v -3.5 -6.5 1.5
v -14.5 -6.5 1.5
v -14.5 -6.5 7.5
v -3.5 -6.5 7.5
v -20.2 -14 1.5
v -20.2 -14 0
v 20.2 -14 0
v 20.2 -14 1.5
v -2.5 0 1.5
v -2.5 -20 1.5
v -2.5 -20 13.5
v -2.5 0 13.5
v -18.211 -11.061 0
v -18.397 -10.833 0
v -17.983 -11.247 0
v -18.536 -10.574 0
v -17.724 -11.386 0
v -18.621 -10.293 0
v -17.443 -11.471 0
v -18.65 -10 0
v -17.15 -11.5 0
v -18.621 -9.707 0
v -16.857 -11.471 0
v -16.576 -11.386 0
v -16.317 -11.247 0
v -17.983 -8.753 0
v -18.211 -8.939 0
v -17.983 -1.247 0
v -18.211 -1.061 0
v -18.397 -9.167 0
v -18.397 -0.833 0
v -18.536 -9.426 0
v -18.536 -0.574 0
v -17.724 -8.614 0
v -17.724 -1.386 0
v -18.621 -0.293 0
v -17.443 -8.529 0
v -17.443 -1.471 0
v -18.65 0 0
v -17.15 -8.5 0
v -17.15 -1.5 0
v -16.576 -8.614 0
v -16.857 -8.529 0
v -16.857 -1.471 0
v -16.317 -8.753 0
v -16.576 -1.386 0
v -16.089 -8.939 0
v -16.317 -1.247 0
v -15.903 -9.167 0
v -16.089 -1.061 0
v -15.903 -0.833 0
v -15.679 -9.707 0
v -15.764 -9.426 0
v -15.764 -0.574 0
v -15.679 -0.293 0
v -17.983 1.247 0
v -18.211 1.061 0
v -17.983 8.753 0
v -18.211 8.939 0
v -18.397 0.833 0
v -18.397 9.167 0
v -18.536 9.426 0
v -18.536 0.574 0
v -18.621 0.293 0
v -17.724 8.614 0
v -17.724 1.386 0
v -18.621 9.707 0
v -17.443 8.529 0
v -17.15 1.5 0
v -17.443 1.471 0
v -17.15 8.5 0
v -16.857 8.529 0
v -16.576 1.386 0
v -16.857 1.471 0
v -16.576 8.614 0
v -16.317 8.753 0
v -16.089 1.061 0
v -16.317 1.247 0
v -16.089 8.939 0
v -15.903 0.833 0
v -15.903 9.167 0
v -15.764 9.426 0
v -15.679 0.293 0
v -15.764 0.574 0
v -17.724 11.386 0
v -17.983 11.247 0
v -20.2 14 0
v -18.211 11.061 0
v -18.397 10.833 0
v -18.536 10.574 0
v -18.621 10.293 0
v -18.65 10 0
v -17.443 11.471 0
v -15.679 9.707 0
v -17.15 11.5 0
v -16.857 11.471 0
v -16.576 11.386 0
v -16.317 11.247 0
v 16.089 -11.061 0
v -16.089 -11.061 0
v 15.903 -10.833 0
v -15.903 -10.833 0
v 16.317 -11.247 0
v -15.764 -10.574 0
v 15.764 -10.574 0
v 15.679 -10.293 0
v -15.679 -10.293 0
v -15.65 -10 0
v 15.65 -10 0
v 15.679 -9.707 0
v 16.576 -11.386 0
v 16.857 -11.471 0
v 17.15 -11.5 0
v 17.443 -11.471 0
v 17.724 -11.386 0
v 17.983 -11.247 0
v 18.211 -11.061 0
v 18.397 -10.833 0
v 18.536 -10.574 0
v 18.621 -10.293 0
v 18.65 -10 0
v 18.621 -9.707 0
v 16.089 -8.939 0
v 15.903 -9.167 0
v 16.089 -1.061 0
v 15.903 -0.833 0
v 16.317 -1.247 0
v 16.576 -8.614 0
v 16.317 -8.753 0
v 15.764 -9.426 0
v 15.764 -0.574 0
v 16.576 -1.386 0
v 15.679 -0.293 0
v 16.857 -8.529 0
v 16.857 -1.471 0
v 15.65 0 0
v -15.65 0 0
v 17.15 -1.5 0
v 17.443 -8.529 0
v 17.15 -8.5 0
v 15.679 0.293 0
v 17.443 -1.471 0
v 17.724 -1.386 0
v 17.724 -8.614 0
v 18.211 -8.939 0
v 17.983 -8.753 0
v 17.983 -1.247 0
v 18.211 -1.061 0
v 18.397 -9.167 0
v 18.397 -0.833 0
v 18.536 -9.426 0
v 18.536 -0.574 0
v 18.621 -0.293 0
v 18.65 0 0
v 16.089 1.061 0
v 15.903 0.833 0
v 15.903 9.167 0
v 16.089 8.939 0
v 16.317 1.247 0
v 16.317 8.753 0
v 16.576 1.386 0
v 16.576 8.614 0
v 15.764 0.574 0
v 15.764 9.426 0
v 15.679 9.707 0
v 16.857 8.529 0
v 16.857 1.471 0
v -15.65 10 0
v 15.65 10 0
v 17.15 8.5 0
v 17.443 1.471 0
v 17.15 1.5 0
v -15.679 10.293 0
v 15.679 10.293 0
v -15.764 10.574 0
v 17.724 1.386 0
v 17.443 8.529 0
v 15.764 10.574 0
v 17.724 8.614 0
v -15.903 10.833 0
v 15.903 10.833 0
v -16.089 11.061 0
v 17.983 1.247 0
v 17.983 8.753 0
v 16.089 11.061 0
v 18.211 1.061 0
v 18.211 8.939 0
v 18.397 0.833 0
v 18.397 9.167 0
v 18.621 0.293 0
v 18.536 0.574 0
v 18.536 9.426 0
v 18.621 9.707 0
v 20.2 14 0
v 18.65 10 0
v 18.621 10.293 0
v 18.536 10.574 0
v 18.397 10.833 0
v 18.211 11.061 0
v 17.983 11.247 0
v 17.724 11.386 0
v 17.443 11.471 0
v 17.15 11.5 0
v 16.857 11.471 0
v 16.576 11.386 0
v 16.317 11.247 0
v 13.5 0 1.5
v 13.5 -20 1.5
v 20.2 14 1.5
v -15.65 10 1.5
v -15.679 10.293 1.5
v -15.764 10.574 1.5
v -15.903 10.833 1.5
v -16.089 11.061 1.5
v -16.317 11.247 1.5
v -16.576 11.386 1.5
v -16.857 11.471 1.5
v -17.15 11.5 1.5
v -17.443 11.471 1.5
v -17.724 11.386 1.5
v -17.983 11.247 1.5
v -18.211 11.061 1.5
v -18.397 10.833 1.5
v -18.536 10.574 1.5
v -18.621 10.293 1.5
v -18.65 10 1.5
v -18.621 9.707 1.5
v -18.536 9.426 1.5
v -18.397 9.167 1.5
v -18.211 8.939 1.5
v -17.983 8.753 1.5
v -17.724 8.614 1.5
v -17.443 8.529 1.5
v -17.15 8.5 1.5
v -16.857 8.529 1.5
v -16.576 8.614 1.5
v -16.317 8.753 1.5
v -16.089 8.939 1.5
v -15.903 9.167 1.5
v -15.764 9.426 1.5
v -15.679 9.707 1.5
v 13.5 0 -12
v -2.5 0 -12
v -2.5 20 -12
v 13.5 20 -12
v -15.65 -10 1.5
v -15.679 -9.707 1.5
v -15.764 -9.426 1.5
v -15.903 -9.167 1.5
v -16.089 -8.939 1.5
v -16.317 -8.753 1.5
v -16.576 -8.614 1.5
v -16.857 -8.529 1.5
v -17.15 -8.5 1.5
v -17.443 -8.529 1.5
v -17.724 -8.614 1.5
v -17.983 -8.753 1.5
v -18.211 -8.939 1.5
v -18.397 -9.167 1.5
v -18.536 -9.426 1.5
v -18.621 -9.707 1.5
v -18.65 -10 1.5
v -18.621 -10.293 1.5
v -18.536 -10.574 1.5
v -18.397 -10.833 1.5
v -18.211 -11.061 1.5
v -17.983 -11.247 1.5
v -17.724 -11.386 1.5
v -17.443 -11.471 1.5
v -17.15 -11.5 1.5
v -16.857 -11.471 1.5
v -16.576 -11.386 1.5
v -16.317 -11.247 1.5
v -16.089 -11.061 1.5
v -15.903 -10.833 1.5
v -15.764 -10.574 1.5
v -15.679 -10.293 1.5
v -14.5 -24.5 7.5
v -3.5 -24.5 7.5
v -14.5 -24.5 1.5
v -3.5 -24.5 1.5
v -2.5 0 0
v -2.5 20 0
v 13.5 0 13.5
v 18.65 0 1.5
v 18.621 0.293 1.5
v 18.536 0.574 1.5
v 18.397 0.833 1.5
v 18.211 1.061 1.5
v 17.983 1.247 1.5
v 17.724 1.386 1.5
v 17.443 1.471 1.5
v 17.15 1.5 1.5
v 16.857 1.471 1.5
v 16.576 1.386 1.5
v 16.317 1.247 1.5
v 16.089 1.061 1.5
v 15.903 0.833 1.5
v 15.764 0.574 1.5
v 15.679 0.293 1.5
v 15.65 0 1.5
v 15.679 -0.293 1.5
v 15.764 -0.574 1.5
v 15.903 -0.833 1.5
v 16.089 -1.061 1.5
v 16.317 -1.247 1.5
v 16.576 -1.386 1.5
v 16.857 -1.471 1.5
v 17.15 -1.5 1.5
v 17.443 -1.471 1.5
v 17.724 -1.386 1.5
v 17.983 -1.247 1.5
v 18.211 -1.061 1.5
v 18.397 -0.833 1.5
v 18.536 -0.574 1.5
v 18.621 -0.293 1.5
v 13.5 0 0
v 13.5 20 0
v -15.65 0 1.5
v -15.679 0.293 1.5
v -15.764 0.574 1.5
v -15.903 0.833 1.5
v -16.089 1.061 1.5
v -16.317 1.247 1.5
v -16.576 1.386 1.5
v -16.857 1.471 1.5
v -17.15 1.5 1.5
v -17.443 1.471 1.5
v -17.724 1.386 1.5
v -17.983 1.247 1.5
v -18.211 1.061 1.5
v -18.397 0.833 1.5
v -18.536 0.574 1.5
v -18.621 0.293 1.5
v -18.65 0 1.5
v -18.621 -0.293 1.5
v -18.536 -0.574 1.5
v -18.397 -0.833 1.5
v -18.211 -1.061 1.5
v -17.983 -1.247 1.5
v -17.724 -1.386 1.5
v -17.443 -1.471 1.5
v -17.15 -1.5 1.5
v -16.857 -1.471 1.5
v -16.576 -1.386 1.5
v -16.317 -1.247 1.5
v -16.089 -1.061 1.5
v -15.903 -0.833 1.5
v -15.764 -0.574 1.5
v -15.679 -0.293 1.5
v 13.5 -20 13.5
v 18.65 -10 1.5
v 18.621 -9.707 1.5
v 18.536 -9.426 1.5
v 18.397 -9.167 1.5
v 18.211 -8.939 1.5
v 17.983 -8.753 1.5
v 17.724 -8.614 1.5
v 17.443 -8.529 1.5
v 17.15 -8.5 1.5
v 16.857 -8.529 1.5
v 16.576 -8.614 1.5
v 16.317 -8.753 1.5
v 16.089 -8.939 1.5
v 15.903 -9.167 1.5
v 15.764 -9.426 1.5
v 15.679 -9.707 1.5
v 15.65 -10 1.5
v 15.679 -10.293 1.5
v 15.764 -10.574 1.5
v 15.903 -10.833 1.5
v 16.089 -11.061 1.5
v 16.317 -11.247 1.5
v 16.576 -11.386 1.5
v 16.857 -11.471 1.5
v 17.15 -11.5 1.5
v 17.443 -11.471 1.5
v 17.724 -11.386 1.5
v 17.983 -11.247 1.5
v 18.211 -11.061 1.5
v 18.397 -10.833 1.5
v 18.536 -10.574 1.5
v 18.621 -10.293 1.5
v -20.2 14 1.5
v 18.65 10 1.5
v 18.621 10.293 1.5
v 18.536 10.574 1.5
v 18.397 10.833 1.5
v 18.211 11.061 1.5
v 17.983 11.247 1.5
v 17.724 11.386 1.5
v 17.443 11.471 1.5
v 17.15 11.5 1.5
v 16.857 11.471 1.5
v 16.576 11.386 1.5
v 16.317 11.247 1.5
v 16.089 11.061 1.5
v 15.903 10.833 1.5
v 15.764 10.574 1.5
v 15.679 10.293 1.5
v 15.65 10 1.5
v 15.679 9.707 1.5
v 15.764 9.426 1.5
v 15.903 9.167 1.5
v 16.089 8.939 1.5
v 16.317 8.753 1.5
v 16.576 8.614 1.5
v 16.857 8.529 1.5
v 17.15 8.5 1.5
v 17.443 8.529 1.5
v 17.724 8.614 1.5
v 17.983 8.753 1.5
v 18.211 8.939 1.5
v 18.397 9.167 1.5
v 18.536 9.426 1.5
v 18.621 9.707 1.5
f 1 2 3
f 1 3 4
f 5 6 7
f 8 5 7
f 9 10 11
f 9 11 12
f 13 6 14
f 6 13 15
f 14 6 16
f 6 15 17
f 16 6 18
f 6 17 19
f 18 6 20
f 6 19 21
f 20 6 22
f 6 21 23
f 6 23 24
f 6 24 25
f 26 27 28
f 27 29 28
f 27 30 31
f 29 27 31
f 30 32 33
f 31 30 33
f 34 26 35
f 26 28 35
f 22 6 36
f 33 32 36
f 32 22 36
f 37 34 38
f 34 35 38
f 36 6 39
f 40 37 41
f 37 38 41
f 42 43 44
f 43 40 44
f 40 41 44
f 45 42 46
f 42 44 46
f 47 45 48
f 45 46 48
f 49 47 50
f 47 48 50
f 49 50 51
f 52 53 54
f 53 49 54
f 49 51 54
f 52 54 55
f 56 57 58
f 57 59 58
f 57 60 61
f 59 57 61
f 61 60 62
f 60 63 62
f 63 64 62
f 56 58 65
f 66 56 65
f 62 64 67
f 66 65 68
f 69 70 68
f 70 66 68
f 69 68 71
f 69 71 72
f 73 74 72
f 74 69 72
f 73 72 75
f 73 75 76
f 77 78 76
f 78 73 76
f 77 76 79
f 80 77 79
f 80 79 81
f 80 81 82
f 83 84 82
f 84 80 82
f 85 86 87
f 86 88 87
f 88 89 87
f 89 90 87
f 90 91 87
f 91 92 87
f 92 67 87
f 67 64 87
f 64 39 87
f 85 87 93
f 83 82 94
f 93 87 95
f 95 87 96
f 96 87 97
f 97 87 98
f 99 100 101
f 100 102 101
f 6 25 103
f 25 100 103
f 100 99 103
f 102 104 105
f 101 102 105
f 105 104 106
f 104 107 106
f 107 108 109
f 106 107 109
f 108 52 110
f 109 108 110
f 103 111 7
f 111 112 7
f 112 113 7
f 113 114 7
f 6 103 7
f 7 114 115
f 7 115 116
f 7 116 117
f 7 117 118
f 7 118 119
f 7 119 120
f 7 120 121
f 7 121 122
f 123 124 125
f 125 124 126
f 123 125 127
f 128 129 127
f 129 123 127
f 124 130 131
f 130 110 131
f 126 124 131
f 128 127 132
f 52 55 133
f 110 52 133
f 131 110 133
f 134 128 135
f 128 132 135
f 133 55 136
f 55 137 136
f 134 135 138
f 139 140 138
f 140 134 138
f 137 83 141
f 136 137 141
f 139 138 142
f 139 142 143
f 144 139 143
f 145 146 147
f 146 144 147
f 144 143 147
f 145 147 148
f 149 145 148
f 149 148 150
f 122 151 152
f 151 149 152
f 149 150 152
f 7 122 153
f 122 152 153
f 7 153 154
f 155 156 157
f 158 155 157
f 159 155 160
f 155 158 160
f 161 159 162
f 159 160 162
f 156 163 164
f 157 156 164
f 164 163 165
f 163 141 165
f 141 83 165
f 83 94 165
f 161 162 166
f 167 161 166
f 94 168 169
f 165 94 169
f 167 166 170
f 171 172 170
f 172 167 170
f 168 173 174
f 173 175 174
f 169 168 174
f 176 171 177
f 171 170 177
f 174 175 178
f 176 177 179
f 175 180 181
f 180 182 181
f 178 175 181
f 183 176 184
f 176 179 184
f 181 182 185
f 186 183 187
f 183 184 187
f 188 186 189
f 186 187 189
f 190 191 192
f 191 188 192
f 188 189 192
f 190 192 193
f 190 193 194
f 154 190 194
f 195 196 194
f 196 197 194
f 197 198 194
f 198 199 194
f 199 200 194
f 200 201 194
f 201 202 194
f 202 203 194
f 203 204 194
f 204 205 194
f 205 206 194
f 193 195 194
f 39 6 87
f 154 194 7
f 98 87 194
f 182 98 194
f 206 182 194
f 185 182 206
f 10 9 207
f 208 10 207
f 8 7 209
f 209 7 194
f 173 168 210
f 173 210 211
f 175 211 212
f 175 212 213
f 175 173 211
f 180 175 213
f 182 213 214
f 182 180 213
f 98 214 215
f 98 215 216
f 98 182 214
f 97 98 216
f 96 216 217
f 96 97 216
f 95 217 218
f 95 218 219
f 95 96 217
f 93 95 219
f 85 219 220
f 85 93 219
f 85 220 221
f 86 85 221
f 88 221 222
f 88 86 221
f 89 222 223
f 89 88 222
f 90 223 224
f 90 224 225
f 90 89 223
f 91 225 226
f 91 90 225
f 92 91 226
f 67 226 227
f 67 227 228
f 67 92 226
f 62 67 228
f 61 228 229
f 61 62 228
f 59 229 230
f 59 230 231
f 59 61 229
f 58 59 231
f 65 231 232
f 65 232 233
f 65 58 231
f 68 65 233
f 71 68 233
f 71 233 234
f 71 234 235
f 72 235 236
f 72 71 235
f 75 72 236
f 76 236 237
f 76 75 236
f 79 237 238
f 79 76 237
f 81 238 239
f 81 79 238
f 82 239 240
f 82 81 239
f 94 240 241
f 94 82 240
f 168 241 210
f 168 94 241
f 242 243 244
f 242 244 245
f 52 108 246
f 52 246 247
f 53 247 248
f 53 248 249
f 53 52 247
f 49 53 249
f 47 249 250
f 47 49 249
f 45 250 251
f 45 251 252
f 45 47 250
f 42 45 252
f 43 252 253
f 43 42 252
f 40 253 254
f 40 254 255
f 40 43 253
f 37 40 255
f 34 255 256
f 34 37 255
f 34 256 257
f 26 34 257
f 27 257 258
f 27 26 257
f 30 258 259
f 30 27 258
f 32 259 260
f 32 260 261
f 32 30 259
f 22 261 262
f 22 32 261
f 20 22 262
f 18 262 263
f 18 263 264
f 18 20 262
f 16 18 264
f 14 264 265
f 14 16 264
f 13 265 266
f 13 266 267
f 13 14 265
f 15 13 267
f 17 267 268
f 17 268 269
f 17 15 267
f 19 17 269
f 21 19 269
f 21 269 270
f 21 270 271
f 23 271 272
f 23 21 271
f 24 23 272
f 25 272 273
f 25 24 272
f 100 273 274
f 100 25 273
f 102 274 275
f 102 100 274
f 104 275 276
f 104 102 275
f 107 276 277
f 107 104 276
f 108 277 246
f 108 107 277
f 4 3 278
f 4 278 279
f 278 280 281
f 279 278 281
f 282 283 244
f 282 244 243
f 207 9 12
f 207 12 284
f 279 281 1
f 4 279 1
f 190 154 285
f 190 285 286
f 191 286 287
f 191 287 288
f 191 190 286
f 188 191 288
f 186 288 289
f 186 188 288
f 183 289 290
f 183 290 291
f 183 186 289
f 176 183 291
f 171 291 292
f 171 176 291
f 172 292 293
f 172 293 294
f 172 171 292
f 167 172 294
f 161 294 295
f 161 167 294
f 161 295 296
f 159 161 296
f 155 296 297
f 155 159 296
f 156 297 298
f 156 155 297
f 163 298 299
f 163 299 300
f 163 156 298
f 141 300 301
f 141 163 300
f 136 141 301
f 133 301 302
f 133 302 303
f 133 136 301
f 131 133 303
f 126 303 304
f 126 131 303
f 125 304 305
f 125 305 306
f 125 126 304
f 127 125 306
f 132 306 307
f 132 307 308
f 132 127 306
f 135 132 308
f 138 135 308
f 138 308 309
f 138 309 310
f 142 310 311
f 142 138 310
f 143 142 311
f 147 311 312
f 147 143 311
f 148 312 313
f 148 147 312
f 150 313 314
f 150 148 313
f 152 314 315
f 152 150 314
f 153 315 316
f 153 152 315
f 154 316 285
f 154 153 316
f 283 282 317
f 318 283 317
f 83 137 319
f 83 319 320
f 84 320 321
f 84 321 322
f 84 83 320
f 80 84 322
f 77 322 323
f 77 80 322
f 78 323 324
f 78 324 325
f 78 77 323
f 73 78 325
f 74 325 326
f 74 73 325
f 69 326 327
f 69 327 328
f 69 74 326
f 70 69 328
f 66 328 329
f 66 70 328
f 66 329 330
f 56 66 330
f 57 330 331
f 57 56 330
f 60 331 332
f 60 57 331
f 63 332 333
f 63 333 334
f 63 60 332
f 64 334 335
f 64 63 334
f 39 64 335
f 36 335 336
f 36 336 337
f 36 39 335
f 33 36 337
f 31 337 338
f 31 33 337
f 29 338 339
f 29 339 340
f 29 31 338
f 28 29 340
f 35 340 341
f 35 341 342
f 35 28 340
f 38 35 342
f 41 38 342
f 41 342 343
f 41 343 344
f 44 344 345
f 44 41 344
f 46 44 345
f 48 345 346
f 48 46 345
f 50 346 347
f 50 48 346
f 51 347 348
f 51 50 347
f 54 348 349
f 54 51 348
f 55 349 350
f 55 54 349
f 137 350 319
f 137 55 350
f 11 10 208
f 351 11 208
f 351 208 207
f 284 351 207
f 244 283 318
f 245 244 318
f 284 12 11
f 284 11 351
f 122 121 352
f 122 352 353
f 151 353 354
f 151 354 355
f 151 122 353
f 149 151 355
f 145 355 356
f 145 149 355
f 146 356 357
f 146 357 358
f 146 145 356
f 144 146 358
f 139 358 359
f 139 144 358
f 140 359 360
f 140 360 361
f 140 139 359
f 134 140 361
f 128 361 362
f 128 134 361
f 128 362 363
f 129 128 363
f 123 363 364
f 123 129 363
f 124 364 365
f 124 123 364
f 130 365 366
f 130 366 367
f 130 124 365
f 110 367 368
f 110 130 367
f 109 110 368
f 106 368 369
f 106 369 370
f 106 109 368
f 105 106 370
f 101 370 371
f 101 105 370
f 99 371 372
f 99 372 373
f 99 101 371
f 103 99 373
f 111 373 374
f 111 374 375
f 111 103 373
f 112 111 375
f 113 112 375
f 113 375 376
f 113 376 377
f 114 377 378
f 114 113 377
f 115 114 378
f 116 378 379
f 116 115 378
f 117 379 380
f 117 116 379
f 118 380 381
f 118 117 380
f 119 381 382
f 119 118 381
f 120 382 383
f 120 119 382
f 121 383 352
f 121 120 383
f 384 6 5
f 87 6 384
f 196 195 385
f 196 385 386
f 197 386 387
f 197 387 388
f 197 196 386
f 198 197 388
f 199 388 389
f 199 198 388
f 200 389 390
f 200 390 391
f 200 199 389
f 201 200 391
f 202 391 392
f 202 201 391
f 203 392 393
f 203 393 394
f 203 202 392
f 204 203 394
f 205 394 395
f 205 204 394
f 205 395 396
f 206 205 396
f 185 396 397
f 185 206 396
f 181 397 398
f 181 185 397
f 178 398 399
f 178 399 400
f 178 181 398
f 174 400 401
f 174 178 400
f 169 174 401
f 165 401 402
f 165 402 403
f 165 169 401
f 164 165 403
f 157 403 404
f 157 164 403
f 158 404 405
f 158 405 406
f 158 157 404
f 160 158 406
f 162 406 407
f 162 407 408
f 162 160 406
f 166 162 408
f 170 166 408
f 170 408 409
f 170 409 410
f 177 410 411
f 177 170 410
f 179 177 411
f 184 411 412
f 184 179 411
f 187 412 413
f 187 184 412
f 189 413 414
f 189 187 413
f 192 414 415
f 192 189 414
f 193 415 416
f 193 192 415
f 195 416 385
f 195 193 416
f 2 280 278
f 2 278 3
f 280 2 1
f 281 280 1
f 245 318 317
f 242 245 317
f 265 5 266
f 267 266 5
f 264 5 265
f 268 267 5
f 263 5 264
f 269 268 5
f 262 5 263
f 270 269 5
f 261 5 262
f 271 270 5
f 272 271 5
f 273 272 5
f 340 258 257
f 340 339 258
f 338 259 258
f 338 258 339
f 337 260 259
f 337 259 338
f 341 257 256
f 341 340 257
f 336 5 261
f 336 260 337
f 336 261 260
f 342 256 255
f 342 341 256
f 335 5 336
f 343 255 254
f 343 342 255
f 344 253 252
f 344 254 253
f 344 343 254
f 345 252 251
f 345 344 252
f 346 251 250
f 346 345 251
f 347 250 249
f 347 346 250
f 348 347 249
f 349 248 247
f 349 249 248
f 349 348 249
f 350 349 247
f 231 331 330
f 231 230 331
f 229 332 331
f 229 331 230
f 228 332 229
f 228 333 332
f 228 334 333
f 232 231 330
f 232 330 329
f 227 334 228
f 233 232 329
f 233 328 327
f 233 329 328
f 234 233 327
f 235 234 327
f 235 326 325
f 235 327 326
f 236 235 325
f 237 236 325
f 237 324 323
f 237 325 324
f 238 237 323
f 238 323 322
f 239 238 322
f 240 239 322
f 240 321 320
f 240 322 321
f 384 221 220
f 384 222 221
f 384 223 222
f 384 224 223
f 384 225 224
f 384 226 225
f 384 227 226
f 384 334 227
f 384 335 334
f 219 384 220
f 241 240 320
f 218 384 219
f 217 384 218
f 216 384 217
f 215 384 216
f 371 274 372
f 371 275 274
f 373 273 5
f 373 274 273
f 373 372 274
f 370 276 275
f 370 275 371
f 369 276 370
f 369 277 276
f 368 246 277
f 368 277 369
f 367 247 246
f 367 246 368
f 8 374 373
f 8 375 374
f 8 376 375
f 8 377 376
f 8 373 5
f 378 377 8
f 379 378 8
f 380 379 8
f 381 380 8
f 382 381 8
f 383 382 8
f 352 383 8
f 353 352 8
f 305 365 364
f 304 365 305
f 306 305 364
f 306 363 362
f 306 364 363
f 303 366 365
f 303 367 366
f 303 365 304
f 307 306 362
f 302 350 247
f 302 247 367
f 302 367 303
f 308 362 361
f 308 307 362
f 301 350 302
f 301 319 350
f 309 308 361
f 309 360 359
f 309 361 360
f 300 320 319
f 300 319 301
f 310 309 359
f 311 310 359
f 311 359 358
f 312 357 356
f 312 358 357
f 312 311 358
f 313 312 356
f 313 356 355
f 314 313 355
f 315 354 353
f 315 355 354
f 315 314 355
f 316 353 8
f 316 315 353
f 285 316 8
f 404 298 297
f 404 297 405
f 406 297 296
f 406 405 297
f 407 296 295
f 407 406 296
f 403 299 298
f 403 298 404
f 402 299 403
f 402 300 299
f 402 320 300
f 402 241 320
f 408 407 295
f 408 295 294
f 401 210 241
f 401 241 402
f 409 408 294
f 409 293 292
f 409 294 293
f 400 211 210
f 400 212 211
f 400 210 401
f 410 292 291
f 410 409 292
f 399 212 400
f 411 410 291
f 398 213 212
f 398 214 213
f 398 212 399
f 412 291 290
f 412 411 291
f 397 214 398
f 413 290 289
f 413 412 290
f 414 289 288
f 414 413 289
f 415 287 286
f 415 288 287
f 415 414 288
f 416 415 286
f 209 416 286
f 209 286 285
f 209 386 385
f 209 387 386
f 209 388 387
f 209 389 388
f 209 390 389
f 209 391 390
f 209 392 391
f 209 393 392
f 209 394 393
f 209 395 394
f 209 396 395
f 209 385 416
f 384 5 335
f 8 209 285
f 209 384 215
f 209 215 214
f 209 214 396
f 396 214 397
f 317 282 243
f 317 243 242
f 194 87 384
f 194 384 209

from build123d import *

# Parameters (mm, degrees)
F0_W     = 40.4
F0_H     = 28
F0_R     = 1.5
F1_DEPTH = 1.5
F2_W     = 16
F2_H     = 20
F3_DEPTH = 12
F4_W     = 16
F4_H     = 20
F5_DEPTH = 12
F6_W     = 11
F6_H     = 18
F7_DEPTH = 6


with BuildPart() as f1:
    # F0 (on Top) → F1 (new body)
    with BuildSketch(Plane.XY):
        Rectangle(F0_W, F0_H)
        with Locations((-17.15, -10)):
            Circle(F0_R, mode=Mode.SUBTRACT)
        with Locations((17.15, -10)):
            Circle(F0_R, mode=Mode.SUBTRACT)
        with Locations((-17.15, 0)):
            Circle(F0_R, mode=Mode.SUBTRACT)
        with Locations((-17.15, 10)):
            Circle(F0_R, mode=Mode.SUBTRACT)
        with Locations((17.15, 0)):
            Circle(F0_R, mode=Mode.SUBTRACT)
        with Locations((17.15, 10)):
            Circle(F0_R, mode=Mode.SUBTRACT)
    extrude(amount=F1_DEPTH)


with BuildPart() as f3:
    # F2 (on face) → F3 (new body)
    with BuildSketch(Plane(origin=(0, 0, 0), x_dir=(1, 0, 0), z_dir=(0, 0, -1))):
        with Locations((5.5, -10)):
            Rectangle(F2_W, F2_H)
    extrude(amount=F3_DEPTH)


with BuildPart() as f5:
    # F4 (on face) → F5 (new body)
    with BuildSketch(Plane.XY.offset(1.5)):
        with Locations((5.5, -10)):
            Rectangle(F4_W, F4_H)
    extrude(amount=F5_DEPTH)


with BuildPart() as f7:
    # F6 (on face) → F7 (new body)
    with BuildSketch(Plane.XY.offset(1.5)):
        with Locations((-9, -15.5)):
            Rectangle(F6_W, F6_H)
    extrude(amount=F7_DEPTH)


solid = Compound([f1.part, f3.part, f5.part, f7.part])
